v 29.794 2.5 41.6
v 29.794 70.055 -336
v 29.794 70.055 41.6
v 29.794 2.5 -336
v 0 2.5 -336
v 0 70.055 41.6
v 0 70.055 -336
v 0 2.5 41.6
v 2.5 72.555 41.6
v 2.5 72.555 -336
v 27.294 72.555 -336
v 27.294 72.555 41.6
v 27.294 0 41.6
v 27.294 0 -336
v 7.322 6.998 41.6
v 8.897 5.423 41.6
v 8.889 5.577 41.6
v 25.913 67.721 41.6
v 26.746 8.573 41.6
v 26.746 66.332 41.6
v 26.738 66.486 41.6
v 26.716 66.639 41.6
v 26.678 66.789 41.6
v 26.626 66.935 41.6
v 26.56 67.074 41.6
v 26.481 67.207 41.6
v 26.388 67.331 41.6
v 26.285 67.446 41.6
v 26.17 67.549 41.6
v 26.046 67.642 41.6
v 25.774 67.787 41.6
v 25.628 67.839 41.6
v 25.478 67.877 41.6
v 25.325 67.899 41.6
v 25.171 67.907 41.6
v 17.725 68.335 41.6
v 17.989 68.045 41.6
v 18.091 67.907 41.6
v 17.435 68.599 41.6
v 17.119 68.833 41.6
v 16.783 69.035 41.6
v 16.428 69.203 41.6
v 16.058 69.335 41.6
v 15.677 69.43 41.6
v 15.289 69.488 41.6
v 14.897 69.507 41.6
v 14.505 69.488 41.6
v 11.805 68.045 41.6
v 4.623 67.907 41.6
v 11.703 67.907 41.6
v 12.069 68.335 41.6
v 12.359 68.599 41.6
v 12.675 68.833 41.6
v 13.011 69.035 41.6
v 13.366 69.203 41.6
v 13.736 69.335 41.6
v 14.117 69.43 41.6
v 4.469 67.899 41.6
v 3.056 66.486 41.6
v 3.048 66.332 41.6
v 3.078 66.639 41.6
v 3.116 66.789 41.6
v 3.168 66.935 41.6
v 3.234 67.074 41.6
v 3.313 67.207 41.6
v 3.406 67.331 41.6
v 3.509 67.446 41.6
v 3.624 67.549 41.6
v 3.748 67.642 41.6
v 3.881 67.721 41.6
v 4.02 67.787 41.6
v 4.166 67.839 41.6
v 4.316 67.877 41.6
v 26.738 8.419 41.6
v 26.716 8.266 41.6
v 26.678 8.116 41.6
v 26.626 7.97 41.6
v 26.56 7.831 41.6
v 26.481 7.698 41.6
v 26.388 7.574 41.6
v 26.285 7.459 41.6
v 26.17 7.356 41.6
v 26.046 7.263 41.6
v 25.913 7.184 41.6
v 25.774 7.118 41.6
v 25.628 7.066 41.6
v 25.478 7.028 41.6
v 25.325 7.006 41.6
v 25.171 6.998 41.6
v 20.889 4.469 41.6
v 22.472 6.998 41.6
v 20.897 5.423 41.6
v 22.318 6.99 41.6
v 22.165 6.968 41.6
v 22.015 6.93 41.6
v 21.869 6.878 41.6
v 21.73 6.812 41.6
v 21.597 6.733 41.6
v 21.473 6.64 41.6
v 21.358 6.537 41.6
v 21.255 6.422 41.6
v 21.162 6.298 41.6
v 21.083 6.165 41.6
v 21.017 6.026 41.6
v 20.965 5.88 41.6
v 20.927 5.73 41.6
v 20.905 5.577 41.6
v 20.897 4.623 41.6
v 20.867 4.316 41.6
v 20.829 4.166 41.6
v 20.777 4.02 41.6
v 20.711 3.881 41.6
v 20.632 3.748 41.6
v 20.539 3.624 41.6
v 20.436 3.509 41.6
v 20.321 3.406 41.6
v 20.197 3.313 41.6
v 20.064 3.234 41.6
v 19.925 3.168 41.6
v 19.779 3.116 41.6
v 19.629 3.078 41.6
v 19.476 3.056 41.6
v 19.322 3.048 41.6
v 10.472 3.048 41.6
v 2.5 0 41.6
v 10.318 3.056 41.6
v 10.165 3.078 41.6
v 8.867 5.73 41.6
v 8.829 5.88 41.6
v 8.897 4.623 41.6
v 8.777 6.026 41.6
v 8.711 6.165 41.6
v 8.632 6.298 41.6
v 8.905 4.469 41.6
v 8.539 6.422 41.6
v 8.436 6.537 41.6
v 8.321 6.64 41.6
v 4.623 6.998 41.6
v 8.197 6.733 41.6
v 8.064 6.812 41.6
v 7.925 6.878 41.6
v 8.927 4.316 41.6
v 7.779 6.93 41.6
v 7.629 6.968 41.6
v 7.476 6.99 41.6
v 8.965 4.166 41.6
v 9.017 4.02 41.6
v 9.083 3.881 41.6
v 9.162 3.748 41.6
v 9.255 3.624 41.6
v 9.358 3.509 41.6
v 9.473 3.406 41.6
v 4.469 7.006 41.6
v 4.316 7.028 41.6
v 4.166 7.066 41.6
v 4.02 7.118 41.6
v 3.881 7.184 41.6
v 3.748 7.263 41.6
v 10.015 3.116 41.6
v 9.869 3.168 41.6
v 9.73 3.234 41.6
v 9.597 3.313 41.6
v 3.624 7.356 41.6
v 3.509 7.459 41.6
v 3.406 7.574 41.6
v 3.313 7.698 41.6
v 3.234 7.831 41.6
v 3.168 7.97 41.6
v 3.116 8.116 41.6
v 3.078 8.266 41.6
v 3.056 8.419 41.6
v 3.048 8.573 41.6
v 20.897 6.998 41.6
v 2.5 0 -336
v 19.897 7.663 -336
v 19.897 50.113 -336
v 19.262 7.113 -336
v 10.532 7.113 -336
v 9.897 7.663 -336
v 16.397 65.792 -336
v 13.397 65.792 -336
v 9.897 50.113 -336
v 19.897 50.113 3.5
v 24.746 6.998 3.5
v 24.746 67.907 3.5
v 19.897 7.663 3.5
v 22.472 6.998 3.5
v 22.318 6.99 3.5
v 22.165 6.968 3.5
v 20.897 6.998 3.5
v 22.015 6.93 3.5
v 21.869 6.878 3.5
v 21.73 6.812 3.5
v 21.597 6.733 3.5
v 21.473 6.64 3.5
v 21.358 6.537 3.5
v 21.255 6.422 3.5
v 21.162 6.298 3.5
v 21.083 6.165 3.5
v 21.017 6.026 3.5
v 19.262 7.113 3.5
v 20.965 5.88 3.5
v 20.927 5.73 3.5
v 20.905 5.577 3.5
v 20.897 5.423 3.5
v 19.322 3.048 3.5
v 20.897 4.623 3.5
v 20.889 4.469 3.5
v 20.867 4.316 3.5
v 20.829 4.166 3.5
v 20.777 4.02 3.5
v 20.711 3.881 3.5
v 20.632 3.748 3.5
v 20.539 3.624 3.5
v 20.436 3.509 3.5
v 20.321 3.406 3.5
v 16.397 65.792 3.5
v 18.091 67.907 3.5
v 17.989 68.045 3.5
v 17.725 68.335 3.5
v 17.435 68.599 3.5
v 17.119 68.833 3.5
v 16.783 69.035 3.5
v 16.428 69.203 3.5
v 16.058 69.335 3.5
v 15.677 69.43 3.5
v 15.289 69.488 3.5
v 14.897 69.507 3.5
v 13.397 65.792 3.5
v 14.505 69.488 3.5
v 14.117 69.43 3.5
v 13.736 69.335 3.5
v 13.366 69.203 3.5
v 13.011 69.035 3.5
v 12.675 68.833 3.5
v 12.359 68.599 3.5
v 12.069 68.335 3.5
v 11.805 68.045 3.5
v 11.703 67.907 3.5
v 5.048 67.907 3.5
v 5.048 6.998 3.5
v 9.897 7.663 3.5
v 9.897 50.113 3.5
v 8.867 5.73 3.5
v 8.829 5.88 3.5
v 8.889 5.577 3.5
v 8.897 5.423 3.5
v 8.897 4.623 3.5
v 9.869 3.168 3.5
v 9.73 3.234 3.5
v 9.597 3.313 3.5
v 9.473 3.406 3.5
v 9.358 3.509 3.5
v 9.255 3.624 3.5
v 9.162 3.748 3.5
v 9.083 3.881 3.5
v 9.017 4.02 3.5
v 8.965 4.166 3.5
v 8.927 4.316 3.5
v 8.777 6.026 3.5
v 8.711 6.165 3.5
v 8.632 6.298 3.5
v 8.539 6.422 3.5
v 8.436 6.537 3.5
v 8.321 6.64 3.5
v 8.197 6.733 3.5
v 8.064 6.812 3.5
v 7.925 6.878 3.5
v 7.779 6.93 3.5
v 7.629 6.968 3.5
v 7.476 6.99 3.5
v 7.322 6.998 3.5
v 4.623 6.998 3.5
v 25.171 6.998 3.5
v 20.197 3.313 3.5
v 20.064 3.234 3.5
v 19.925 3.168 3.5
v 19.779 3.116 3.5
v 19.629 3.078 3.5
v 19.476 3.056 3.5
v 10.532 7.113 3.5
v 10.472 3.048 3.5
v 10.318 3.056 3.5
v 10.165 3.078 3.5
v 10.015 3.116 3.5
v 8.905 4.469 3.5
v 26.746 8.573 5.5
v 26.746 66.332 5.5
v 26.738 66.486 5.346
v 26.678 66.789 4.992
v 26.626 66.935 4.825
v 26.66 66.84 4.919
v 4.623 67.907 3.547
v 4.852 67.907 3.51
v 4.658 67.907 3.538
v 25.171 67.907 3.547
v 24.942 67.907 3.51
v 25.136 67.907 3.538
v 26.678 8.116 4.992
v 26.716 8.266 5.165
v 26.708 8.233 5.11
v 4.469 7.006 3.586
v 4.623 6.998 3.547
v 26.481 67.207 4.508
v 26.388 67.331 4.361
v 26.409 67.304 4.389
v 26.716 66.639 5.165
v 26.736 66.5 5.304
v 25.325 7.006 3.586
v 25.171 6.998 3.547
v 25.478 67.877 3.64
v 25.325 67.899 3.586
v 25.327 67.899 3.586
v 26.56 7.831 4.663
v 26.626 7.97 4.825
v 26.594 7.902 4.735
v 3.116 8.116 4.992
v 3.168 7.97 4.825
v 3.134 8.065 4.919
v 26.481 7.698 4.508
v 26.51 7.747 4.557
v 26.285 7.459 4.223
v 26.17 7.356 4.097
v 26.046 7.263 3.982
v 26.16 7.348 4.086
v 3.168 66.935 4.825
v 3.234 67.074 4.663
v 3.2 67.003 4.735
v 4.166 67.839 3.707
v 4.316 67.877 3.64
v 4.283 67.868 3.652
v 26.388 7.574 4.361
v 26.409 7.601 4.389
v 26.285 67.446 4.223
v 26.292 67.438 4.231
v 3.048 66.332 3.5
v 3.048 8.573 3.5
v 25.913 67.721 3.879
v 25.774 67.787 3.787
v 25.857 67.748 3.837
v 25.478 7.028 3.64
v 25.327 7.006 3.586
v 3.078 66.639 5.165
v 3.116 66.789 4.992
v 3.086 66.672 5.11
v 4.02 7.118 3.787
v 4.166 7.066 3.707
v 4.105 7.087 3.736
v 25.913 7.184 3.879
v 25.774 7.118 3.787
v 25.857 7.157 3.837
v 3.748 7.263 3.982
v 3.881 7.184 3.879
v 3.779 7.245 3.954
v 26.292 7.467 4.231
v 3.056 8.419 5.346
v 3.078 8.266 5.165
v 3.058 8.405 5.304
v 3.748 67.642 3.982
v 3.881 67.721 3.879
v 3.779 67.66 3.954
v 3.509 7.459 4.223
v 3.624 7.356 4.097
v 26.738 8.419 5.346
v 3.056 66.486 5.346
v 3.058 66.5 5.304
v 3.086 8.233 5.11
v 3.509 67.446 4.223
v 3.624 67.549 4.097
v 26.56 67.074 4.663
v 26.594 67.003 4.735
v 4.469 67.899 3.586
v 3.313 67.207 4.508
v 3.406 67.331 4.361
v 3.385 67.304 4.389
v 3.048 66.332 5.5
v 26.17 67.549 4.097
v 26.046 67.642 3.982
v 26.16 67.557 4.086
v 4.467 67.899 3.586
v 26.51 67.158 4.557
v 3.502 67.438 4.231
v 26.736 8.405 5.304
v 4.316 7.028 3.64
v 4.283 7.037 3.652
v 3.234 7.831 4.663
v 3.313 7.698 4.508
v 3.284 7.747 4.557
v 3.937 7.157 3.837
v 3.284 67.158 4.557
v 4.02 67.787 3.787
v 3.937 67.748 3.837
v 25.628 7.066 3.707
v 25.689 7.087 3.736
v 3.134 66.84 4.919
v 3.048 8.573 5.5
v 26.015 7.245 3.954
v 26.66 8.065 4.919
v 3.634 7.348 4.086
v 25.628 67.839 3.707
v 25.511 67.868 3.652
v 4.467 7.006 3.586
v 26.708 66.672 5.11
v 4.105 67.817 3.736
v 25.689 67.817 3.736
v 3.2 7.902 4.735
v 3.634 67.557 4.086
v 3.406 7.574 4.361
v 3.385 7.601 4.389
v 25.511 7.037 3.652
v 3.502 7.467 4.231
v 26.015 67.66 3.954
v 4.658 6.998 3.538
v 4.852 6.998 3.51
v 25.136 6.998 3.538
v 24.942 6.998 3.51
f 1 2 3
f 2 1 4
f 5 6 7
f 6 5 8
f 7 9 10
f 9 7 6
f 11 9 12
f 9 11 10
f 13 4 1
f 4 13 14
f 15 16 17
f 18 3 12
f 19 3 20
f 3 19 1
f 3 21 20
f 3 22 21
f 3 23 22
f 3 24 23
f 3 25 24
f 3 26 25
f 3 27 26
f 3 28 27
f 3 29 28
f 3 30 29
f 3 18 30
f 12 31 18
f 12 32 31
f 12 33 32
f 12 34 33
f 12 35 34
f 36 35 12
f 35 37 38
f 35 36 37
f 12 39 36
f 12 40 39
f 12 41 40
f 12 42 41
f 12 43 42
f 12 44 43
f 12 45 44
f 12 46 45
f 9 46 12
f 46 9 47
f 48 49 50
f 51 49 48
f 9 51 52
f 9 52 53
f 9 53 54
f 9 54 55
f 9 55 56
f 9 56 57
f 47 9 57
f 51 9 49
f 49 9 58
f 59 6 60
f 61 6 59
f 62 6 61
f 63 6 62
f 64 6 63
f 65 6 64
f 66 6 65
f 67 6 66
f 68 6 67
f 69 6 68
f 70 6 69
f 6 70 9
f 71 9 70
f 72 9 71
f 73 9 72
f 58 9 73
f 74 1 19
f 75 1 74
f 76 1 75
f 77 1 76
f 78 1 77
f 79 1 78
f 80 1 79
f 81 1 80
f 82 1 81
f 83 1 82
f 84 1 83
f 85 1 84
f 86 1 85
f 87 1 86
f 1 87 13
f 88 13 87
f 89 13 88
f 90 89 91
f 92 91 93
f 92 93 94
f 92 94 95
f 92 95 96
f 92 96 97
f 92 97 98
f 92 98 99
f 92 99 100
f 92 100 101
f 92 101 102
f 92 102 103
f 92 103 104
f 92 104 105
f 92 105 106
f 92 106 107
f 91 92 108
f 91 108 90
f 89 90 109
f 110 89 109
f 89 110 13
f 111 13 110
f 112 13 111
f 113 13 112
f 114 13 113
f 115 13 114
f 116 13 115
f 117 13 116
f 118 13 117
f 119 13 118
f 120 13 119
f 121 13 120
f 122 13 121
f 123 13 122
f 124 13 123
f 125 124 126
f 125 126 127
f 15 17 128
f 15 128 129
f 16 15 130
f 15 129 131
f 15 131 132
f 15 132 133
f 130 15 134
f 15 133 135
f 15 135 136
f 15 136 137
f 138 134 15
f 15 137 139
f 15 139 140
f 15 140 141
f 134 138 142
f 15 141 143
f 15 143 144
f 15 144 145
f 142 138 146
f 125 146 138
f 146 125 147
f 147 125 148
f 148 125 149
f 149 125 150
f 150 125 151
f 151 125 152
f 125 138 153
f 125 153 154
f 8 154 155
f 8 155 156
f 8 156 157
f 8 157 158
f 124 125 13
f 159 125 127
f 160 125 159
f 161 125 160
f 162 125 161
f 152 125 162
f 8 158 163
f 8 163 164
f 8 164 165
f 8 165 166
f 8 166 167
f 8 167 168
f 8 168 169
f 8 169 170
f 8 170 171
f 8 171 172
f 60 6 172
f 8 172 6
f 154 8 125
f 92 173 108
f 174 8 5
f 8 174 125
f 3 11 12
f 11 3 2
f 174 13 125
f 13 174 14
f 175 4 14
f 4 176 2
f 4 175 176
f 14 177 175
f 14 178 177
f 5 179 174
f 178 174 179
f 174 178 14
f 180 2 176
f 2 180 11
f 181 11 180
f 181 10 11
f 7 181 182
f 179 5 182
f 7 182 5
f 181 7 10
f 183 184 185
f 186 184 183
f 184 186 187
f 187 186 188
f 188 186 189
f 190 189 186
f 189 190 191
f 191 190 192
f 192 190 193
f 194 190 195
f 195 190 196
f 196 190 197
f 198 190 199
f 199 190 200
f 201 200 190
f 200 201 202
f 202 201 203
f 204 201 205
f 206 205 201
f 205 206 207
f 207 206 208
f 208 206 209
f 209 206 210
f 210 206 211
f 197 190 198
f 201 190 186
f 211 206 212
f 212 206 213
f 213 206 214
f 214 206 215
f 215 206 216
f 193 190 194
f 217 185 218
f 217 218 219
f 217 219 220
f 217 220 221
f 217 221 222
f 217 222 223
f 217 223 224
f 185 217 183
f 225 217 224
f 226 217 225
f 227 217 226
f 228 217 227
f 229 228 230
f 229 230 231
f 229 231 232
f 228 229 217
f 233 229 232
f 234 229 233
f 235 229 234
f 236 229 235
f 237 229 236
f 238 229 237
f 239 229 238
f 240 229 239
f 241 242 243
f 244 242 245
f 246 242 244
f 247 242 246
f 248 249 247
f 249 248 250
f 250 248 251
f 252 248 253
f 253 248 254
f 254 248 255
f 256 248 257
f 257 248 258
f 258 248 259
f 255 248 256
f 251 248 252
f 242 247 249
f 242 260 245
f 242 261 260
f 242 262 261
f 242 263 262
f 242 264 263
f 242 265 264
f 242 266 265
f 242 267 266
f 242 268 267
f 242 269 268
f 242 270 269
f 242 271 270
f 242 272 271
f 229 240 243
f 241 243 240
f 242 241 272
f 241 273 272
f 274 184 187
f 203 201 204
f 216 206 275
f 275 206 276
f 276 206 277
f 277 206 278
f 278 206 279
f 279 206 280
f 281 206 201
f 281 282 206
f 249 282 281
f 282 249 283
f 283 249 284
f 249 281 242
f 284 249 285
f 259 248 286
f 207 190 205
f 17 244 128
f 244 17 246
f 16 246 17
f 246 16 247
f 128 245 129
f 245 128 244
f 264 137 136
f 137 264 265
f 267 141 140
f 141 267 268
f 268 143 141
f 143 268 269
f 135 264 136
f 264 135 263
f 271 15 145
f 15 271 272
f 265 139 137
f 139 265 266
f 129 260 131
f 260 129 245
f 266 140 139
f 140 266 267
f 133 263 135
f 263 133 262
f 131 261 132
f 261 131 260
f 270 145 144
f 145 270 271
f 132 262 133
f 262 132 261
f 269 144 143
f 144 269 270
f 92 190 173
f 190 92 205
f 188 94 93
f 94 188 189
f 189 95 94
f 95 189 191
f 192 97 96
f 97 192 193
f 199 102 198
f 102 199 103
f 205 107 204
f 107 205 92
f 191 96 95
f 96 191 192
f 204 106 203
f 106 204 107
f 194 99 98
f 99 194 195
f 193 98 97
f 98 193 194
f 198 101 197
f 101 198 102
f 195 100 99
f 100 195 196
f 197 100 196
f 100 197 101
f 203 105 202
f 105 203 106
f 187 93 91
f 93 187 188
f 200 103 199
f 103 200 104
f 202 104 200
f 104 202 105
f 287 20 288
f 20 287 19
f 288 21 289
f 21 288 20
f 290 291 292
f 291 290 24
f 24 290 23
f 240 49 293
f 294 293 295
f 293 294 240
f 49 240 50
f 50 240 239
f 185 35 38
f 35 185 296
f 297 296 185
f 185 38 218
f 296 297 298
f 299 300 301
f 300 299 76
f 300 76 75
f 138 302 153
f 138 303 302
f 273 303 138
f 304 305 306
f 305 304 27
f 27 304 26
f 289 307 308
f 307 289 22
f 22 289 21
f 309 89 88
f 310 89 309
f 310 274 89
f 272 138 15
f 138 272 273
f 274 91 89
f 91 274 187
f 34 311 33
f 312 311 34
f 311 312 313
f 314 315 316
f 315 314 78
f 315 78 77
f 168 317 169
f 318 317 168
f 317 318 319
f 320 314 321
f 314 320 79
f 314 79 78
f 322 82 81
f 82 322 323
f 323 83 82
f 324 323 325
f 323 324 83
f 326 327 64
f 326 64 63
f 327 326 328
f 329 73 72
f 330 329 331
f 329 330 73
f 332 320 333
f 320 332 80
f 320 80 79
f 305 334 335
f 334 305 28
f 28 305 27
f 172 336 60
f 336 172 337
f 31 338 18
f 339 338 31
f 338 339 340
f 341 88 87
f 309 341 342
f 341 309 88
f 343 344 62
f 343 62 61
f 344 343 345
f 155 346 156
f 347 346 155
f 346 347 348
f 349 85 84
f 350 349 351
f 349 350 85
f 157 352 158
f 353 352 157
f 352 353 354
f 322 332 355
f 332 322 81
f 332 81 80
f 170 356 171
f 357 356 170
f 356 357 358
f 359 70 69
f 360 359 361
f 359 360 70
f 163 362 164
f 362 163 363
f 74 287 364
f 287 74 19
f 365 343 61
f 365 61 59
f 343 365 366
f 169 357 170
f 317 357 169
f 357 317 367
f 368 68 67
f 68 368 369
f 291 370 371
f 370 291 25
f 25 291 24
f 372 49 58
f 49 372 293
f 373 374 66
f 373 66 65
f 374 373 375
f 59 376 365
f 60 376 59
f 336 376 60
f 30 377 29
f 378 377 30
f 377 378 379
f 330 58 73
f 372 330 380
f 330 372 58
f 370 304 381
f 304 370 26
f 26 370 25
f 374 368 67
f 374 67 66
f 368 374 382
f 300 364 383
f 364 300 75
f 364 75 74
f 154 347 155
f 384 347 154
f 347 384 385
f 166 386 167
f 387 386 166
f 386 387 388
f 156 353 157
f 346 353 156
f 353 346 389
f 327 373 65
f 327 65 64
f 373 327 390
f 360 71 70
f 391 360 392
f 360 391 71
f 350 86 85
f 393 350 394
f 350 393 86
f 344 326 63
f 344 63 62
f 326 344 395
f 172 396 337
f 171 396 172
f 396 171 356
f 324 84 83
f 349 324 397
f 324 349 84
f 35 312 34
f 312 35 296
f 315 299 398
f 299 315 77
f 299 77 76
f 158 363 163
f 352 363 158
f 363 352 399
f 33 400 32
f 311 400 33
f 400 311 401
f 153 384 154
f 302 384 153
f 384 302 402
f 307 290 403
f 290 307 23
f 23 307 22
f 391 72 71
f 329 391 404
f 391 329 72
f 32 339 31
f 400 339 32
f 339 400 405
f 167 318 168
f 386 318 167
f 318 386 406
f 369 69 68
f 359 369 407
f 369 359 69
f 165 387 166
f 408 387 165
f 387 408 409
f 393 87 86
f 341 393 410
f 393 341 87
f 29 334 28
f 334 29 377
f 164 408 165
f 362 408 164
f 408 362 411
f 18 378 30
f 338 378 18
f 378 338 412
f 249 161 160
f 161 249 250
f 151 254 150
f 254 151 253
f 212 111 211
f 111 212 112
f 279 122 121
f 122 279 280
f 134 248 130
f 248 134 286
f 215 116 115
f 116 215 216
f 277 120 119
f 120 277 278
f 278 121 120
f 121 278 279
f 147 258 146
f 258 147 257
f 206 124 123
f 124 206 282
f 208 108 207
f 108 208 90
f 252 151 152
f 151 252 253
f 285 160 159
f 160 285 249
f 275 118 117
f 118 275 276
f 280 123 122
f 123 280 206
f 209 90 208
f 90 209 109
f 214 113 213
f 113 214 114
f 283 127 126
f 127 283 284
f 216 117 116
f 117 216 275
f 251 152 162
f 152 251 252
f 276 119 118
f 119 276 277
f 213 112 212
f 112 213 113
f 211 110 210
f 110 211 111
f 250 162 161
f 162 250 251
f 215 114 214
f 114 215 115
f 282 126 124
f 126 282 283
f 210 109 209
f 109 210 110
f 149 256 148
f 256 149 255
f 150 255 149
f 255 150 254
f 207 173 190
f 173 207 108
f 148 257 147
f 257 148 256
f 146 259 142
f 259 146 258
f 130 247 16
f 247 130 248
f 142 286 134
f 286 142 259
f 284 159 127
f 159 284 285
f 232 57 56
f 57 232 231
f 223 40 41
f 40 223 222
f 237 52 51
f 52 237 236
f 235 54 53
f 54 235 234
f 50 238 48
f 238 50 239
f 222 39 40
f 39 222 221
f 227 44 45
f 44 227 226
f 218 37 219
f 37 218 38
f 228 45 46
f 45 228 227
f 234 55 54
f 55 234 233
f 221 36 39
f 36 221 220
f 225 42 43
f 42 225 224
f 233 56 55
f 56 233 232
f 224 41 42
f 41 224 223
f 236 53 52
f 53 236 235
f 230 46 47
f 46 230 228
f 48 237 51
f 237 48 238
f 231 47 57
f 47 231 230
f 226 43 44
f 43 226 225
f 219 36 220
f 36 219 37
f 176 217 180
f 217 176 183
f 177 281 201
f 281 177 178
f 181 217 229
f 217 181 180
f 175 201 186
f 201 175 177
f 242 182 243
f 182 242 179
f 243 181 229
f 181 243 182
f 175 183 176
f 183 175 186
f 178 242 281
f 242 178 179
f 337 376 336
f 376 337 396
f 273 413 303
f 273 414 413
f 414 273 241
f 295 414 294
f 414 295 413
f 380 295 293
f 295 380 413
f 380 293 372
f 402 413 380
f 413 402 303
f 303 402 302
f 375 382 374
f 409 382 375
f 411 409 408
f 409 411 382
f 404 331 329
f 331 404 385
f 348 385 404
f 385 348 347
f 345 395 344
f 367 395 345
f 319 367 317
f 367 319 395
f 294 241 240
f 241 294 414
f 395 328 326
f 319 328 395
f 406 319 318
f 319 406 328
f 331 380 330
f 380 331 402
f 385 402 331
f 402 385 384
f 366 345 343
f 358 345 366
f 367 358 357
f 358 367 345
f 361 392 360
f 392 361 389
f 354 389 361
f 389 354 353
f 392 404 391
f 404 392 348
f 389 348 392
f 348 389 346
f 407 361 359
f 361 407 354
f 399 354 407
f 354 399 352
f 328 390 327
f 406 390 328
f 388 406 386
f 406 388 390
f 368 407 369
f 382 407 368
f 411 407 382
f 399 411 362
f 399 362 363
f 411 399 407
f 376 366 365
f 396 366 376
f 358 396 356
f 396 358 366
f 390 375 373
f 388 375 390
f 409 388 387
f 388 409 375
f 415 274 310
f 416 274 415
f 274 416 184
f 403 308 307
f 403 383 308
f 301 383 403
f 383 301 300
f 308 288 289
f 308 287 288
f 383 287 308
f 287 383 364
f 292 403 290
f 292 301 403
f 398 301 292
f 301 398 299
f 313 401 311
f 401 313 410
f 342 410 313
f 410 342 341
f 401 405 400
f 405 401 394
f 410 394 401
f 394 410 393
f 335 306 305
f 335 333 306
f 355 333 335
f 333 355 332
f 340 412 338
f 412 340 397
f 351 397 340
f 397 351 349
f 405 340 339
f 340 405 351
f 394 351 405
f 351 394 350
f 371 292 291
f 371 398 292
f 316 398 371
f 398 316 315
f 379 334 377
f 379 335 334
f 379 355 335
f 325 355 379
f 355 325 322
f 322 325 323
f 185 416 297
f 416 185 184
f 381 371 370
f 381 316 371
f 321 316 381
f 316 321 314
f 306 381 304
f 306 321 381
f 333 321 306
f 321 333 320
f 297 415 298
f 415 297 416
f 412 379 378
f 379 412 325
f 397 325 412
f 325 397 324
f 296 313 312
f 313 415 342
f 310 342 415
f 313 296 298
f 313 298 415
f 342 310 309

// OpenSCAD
// PMAG Speedloader - Magazine Interface Section
// All dimensions in mm

// === PARAMETERS ===

// Wall thickness and rim
wall_thickness = 3.5;
rim_width = 3.048;  // Width of rim beyond notches
outer_bevel = 2.5;       // Bevel size on outer corners

// Rectangular notch (at one end) - centered on cavity edge
rect_notch_width = 12;        // Width of notch across the opening
rect_notch_thickness = 7.9;     // Thickness along length (half in rim, half in cavity)
rect_notch_corner_radius = 1.575; // Radius for rounded corners on the rectangle itself

// Circular notch (at other end) - centered on opposite cavity edge, offset along length
circ_notch_diameter = 8;
circ_notch_length_offset = 2.4;  // Offset from cavity edge along length direction (inward)

// Inner cavity dimensions (the main magazine opening)
inner_length = 60.909;       // Length of cavity
inner_width = 23.698;        // Width of cavity
inner_depth = 38.1;        // Depth from bottom to top of cavity
inner_corner_radius = 1.575;  // Radius for rounded inside edges
bottom_edge_radius = 2;      // Radius for rounded edges at bottom of cavity (left/right sides)

// Round cutout dimensions (for ammunition)
casing_base = 10;            // Width of rectangular base
casing_height = 43;          // Height of rectangular base
base_chamfer_size = 0.635;   // Base length of equilateral triangle chamfer at bottom corners
trap_short_base = 3;         // Short base of trapezoid (point)
trap_long_base = 10;         // Long base of trapezoid (lines up with casing)
trap_leg_length = 16.06;        // Length of trapezoid leg
trap_angle = 77.5;           // Angle of trapezoid

// Round cutout position offsets
round_offset_x = 0;          // X offset from center (positive = right, negative = left)
round_offset_y = -1;          // Y offset along length (positive = toward circular notch, negative = toward rect notch)
round_offset_z = 0;          // Z offset (positive = higher/up, negative = lower/down)

// Speedloader extension
speedloader_depth = 336;     // Total depth of speedloader below mag interface
trap_height = trap_leg_length * sin(trap_angle);  // Calculated trapezoid height

// Calculated outer dimensions (ensures rim_width beyond all features)
outer_width = max(inner_width + 2*rim_width, rect_notch_width + 2*rim_width, circ_notch_diameter + 2*rim_width);
outer_length = inner_length + rect_notch_thickness/2 + (circ_notch_diameter/2 - circ_notch_length_offset) + 2*rim_width;
outer_height = inner_depth + wall_thickness;
inner_height = inner_depth + 1;  // Slightly taller to cut through cleanly

// === MODULES ===

module beveled_cube(size, bevel) {
    // Create a cube with chamfered vertical corners only - diagonal cuts at corners
    hull() {
        // Place cylinders at each corner
        for(x = [bevel, size[0] - bevel]) {
            for(y = [bevel, size[1] - bevel]) {
                translate([x, y, 0])
                    cylinder(r=bevel, h=size[2], $fn=4);  // $fn=4 makes it diamond-shaped for chamfer
            }
        }
    }
}

module internal_corner_fillet(r, h) {
    // Creates a quarter-round fillet cutter for internal corners
    // Cylinder at origin (0,0)
    difference() {
        cube([r, r, h]);
        cylinder(r=r, h=h);
    }
}

module internal_corner_fillet_right(r, h) {
    // Creates a quarter-round fillet cutter for right side corner
    // Cylinder at (r, 0) - cube extends in -X, +Y from corner
    difference() {
        cube([r, r, h]);
        translate([r, 0, 0])
            cylinder(r=r, h=h);
    }
}

module bottom_edge_fillet_left(r, l) {
    // Creates a quarter-round concave fillet for left bottom edge
    // Curved surface faces right (into cavity)
    difference() {
        cube([r, l, r]);
        translate([r, 0, r])
            rotate([-90, 0, 0])
                cylinder(r=r, h=l);
    }
}

module bottom_edge_fillet_right(r, l) {
    // Creates a quarter-round concave fillet for right bottom edge
    // Curved surface faces left (into cavity)
    difference() {
        cube([r, l, r]);
        translate([0, 0, r])
            rotate([-90, 0, 0])
                cylinder(r=r, h=l);
    }
}

module round_profile() {
    // Creates 2D profile of a round (ammunition)
    // Rectangle base with chamfered bottom corners + trapezoid point

    // Calculate chamfer height for equilateral triangle
    chamfer_height = base_chamfer_size * sqrt(3) / 2;

    union() {
        // Rectangle base with chamfered bottom corners
        polygon([
            // Bottom left, chamfered
            [-casing_base/2 + base_chamfer_size, -casing_height/2],
            [-casing_base/2, -casing_height/2 + chamfer_height],
            // Left side
            [-casing_base/2, casing_height/2],
            // Top left
            [-casing_base/2, casing_height/2],
            // Top right
            [casing_base/2, casing_height/2],
            // Right side
            [casing_base/2, -casing_height/2 + chamfer_height],
            // Bottom right, chamfered
            [casing_base/2 - base_chamfer_size, -casing_height/2]
        ]);

        // Trapezoid point on top
        translate([0, casing_height/2 + trap_height/2, 0])
        polygon([
            [-trap_long_base/2, -trap_height/2],
            [trap_long_base/2, -trap_height/2],
            [trap_short_base/2, trap_height/2],
            [-trap_short_base/2, trap_height/2]
        ]);
    }
}

// === MAIN MODEL ===

$fn = 64;  // Resolution for curves

union() {
    difference() {
        // Outer shell with beveled edges + extension below
        union() {
            beveled_cube([outer_width, outer_length, outer_height], outer_bevel);
            translate([0, 0, -speedloader_depth])
                beveled_cube([outer_width, outer_length, speedloader_depth], outer_bevel);
        }

    // Inner cavity with rounded edges
    // Positioned so there's rim_width + rect_notch_thickness/2 from front edge
    translate([(outer_width - inner_width)/2,
               rim_width + rect_notch_thickness/2,
               wall_thickness]) {
        hull() {
            // Create rounded corners using cylinders at each corner
            for(x = [inner_corner_radius, inner_width - inner_corner_radius]) {
                for(y = [inner_corner_radius, inner_length - inner_corner_radius]) {
                    translate([x, y, 0])
                        cylinder(r=inner_corner_radius, h=inner_height);
                }
            }
        }
    }

    // Rectangular notch at one end - centered on cavity front edge (half in rim, half in cavity)
    translate([outer_width/2 - rect_notch_width/2,
               rim_width,  // Centered on cavity front edge
               wall_thickness]) {
        hull() {
            // Create rounded corners with cylinders at each corner
            for(x = [rect_notch_corner_radius, rect_notch_width - rect_notch_corner_radius]) {
                for(y = [rect_notch_corner_radius, rect_notch_thickness - rect_notch_corner_radius]) {
                    translate([x, y, 0])
                        cylinder(r=rect_notch_corner_radius, h=inner_height);
                }
            }
        }
    }

    // Circular notch at other end - on opposite cavity edge, offset inward along length
    translate([outer_width/2,  // Centered along width
               rim_width + rect_notch_thickness/2 + inner_length - circ_notch_length_offset,  // On cavity back edge, offset inward
               wall_thickness]) {
        cylinder(d=circ_notch_diameter, h=inner_height);
    }

    // Internal corner fillets where rectangular notch side walls meet cavity front edge
    // Left corner
    translate([outer_width/2 - rect_notch_width/2 - rect_notch_corner_radius,
               rim_width + rect_notch_thickness/2 - rect_notch_corner_radius,
               wall_thickness]) {
        rotate([0, 0, 0])
            internal_corner_fillet(rect_notch_corner_radius, inner_height);
    }

    // Right corner
    translate([outer_width/2 + rect_notch_width/2,
               rim_width + rect_notch_thickness/2 - rect_notch_corner_radius,
               wall_thickness]) {
        internal_corner_fillet_right(rect_notch_corner_radius, inner_height);
    }

    // Round cutout hole going down through entire speedloader
    // Centered in cavity, rectangle base at rectangular notch side, trapezoid at circular notch side
    translate([outer_width/2 + round_offset_x,
               rim_width + rect_notch_thickness/2 + inner_length/2 - trap_height/2 + round_offset_y,
               outer_height + round_offset_z]) {
        scale([1, 1, -1])
            linear_extrude(height = speedloader_depth + outer_height+0.01)
                round_profile();
    }
    }

    // Bottom edge fillets on left and right sides of cavity (added material for concave curve)
    // Left side bottom edge - fillet fills the corner inward (curved surface faces right)
    translate([(outer_width - inner_width)/2,
               rim_width + rect_notch_thickness/2,
               wall_thickness]) {
        bottom_edge_fillet_left(bottom_edge_radius, inner_length);
    }

    // Right side bottom edge - fillet fills the corner inward (curved surface faces left)
    translate([(outer_width + inner_width)/2 - bottom_edge_radius,
               rim_width + rect_notch_thickness/2,
               wall_thickness]) {
        bottom_edge_fillet_right(bottom_edge_radius, inner_length);
    }
}
